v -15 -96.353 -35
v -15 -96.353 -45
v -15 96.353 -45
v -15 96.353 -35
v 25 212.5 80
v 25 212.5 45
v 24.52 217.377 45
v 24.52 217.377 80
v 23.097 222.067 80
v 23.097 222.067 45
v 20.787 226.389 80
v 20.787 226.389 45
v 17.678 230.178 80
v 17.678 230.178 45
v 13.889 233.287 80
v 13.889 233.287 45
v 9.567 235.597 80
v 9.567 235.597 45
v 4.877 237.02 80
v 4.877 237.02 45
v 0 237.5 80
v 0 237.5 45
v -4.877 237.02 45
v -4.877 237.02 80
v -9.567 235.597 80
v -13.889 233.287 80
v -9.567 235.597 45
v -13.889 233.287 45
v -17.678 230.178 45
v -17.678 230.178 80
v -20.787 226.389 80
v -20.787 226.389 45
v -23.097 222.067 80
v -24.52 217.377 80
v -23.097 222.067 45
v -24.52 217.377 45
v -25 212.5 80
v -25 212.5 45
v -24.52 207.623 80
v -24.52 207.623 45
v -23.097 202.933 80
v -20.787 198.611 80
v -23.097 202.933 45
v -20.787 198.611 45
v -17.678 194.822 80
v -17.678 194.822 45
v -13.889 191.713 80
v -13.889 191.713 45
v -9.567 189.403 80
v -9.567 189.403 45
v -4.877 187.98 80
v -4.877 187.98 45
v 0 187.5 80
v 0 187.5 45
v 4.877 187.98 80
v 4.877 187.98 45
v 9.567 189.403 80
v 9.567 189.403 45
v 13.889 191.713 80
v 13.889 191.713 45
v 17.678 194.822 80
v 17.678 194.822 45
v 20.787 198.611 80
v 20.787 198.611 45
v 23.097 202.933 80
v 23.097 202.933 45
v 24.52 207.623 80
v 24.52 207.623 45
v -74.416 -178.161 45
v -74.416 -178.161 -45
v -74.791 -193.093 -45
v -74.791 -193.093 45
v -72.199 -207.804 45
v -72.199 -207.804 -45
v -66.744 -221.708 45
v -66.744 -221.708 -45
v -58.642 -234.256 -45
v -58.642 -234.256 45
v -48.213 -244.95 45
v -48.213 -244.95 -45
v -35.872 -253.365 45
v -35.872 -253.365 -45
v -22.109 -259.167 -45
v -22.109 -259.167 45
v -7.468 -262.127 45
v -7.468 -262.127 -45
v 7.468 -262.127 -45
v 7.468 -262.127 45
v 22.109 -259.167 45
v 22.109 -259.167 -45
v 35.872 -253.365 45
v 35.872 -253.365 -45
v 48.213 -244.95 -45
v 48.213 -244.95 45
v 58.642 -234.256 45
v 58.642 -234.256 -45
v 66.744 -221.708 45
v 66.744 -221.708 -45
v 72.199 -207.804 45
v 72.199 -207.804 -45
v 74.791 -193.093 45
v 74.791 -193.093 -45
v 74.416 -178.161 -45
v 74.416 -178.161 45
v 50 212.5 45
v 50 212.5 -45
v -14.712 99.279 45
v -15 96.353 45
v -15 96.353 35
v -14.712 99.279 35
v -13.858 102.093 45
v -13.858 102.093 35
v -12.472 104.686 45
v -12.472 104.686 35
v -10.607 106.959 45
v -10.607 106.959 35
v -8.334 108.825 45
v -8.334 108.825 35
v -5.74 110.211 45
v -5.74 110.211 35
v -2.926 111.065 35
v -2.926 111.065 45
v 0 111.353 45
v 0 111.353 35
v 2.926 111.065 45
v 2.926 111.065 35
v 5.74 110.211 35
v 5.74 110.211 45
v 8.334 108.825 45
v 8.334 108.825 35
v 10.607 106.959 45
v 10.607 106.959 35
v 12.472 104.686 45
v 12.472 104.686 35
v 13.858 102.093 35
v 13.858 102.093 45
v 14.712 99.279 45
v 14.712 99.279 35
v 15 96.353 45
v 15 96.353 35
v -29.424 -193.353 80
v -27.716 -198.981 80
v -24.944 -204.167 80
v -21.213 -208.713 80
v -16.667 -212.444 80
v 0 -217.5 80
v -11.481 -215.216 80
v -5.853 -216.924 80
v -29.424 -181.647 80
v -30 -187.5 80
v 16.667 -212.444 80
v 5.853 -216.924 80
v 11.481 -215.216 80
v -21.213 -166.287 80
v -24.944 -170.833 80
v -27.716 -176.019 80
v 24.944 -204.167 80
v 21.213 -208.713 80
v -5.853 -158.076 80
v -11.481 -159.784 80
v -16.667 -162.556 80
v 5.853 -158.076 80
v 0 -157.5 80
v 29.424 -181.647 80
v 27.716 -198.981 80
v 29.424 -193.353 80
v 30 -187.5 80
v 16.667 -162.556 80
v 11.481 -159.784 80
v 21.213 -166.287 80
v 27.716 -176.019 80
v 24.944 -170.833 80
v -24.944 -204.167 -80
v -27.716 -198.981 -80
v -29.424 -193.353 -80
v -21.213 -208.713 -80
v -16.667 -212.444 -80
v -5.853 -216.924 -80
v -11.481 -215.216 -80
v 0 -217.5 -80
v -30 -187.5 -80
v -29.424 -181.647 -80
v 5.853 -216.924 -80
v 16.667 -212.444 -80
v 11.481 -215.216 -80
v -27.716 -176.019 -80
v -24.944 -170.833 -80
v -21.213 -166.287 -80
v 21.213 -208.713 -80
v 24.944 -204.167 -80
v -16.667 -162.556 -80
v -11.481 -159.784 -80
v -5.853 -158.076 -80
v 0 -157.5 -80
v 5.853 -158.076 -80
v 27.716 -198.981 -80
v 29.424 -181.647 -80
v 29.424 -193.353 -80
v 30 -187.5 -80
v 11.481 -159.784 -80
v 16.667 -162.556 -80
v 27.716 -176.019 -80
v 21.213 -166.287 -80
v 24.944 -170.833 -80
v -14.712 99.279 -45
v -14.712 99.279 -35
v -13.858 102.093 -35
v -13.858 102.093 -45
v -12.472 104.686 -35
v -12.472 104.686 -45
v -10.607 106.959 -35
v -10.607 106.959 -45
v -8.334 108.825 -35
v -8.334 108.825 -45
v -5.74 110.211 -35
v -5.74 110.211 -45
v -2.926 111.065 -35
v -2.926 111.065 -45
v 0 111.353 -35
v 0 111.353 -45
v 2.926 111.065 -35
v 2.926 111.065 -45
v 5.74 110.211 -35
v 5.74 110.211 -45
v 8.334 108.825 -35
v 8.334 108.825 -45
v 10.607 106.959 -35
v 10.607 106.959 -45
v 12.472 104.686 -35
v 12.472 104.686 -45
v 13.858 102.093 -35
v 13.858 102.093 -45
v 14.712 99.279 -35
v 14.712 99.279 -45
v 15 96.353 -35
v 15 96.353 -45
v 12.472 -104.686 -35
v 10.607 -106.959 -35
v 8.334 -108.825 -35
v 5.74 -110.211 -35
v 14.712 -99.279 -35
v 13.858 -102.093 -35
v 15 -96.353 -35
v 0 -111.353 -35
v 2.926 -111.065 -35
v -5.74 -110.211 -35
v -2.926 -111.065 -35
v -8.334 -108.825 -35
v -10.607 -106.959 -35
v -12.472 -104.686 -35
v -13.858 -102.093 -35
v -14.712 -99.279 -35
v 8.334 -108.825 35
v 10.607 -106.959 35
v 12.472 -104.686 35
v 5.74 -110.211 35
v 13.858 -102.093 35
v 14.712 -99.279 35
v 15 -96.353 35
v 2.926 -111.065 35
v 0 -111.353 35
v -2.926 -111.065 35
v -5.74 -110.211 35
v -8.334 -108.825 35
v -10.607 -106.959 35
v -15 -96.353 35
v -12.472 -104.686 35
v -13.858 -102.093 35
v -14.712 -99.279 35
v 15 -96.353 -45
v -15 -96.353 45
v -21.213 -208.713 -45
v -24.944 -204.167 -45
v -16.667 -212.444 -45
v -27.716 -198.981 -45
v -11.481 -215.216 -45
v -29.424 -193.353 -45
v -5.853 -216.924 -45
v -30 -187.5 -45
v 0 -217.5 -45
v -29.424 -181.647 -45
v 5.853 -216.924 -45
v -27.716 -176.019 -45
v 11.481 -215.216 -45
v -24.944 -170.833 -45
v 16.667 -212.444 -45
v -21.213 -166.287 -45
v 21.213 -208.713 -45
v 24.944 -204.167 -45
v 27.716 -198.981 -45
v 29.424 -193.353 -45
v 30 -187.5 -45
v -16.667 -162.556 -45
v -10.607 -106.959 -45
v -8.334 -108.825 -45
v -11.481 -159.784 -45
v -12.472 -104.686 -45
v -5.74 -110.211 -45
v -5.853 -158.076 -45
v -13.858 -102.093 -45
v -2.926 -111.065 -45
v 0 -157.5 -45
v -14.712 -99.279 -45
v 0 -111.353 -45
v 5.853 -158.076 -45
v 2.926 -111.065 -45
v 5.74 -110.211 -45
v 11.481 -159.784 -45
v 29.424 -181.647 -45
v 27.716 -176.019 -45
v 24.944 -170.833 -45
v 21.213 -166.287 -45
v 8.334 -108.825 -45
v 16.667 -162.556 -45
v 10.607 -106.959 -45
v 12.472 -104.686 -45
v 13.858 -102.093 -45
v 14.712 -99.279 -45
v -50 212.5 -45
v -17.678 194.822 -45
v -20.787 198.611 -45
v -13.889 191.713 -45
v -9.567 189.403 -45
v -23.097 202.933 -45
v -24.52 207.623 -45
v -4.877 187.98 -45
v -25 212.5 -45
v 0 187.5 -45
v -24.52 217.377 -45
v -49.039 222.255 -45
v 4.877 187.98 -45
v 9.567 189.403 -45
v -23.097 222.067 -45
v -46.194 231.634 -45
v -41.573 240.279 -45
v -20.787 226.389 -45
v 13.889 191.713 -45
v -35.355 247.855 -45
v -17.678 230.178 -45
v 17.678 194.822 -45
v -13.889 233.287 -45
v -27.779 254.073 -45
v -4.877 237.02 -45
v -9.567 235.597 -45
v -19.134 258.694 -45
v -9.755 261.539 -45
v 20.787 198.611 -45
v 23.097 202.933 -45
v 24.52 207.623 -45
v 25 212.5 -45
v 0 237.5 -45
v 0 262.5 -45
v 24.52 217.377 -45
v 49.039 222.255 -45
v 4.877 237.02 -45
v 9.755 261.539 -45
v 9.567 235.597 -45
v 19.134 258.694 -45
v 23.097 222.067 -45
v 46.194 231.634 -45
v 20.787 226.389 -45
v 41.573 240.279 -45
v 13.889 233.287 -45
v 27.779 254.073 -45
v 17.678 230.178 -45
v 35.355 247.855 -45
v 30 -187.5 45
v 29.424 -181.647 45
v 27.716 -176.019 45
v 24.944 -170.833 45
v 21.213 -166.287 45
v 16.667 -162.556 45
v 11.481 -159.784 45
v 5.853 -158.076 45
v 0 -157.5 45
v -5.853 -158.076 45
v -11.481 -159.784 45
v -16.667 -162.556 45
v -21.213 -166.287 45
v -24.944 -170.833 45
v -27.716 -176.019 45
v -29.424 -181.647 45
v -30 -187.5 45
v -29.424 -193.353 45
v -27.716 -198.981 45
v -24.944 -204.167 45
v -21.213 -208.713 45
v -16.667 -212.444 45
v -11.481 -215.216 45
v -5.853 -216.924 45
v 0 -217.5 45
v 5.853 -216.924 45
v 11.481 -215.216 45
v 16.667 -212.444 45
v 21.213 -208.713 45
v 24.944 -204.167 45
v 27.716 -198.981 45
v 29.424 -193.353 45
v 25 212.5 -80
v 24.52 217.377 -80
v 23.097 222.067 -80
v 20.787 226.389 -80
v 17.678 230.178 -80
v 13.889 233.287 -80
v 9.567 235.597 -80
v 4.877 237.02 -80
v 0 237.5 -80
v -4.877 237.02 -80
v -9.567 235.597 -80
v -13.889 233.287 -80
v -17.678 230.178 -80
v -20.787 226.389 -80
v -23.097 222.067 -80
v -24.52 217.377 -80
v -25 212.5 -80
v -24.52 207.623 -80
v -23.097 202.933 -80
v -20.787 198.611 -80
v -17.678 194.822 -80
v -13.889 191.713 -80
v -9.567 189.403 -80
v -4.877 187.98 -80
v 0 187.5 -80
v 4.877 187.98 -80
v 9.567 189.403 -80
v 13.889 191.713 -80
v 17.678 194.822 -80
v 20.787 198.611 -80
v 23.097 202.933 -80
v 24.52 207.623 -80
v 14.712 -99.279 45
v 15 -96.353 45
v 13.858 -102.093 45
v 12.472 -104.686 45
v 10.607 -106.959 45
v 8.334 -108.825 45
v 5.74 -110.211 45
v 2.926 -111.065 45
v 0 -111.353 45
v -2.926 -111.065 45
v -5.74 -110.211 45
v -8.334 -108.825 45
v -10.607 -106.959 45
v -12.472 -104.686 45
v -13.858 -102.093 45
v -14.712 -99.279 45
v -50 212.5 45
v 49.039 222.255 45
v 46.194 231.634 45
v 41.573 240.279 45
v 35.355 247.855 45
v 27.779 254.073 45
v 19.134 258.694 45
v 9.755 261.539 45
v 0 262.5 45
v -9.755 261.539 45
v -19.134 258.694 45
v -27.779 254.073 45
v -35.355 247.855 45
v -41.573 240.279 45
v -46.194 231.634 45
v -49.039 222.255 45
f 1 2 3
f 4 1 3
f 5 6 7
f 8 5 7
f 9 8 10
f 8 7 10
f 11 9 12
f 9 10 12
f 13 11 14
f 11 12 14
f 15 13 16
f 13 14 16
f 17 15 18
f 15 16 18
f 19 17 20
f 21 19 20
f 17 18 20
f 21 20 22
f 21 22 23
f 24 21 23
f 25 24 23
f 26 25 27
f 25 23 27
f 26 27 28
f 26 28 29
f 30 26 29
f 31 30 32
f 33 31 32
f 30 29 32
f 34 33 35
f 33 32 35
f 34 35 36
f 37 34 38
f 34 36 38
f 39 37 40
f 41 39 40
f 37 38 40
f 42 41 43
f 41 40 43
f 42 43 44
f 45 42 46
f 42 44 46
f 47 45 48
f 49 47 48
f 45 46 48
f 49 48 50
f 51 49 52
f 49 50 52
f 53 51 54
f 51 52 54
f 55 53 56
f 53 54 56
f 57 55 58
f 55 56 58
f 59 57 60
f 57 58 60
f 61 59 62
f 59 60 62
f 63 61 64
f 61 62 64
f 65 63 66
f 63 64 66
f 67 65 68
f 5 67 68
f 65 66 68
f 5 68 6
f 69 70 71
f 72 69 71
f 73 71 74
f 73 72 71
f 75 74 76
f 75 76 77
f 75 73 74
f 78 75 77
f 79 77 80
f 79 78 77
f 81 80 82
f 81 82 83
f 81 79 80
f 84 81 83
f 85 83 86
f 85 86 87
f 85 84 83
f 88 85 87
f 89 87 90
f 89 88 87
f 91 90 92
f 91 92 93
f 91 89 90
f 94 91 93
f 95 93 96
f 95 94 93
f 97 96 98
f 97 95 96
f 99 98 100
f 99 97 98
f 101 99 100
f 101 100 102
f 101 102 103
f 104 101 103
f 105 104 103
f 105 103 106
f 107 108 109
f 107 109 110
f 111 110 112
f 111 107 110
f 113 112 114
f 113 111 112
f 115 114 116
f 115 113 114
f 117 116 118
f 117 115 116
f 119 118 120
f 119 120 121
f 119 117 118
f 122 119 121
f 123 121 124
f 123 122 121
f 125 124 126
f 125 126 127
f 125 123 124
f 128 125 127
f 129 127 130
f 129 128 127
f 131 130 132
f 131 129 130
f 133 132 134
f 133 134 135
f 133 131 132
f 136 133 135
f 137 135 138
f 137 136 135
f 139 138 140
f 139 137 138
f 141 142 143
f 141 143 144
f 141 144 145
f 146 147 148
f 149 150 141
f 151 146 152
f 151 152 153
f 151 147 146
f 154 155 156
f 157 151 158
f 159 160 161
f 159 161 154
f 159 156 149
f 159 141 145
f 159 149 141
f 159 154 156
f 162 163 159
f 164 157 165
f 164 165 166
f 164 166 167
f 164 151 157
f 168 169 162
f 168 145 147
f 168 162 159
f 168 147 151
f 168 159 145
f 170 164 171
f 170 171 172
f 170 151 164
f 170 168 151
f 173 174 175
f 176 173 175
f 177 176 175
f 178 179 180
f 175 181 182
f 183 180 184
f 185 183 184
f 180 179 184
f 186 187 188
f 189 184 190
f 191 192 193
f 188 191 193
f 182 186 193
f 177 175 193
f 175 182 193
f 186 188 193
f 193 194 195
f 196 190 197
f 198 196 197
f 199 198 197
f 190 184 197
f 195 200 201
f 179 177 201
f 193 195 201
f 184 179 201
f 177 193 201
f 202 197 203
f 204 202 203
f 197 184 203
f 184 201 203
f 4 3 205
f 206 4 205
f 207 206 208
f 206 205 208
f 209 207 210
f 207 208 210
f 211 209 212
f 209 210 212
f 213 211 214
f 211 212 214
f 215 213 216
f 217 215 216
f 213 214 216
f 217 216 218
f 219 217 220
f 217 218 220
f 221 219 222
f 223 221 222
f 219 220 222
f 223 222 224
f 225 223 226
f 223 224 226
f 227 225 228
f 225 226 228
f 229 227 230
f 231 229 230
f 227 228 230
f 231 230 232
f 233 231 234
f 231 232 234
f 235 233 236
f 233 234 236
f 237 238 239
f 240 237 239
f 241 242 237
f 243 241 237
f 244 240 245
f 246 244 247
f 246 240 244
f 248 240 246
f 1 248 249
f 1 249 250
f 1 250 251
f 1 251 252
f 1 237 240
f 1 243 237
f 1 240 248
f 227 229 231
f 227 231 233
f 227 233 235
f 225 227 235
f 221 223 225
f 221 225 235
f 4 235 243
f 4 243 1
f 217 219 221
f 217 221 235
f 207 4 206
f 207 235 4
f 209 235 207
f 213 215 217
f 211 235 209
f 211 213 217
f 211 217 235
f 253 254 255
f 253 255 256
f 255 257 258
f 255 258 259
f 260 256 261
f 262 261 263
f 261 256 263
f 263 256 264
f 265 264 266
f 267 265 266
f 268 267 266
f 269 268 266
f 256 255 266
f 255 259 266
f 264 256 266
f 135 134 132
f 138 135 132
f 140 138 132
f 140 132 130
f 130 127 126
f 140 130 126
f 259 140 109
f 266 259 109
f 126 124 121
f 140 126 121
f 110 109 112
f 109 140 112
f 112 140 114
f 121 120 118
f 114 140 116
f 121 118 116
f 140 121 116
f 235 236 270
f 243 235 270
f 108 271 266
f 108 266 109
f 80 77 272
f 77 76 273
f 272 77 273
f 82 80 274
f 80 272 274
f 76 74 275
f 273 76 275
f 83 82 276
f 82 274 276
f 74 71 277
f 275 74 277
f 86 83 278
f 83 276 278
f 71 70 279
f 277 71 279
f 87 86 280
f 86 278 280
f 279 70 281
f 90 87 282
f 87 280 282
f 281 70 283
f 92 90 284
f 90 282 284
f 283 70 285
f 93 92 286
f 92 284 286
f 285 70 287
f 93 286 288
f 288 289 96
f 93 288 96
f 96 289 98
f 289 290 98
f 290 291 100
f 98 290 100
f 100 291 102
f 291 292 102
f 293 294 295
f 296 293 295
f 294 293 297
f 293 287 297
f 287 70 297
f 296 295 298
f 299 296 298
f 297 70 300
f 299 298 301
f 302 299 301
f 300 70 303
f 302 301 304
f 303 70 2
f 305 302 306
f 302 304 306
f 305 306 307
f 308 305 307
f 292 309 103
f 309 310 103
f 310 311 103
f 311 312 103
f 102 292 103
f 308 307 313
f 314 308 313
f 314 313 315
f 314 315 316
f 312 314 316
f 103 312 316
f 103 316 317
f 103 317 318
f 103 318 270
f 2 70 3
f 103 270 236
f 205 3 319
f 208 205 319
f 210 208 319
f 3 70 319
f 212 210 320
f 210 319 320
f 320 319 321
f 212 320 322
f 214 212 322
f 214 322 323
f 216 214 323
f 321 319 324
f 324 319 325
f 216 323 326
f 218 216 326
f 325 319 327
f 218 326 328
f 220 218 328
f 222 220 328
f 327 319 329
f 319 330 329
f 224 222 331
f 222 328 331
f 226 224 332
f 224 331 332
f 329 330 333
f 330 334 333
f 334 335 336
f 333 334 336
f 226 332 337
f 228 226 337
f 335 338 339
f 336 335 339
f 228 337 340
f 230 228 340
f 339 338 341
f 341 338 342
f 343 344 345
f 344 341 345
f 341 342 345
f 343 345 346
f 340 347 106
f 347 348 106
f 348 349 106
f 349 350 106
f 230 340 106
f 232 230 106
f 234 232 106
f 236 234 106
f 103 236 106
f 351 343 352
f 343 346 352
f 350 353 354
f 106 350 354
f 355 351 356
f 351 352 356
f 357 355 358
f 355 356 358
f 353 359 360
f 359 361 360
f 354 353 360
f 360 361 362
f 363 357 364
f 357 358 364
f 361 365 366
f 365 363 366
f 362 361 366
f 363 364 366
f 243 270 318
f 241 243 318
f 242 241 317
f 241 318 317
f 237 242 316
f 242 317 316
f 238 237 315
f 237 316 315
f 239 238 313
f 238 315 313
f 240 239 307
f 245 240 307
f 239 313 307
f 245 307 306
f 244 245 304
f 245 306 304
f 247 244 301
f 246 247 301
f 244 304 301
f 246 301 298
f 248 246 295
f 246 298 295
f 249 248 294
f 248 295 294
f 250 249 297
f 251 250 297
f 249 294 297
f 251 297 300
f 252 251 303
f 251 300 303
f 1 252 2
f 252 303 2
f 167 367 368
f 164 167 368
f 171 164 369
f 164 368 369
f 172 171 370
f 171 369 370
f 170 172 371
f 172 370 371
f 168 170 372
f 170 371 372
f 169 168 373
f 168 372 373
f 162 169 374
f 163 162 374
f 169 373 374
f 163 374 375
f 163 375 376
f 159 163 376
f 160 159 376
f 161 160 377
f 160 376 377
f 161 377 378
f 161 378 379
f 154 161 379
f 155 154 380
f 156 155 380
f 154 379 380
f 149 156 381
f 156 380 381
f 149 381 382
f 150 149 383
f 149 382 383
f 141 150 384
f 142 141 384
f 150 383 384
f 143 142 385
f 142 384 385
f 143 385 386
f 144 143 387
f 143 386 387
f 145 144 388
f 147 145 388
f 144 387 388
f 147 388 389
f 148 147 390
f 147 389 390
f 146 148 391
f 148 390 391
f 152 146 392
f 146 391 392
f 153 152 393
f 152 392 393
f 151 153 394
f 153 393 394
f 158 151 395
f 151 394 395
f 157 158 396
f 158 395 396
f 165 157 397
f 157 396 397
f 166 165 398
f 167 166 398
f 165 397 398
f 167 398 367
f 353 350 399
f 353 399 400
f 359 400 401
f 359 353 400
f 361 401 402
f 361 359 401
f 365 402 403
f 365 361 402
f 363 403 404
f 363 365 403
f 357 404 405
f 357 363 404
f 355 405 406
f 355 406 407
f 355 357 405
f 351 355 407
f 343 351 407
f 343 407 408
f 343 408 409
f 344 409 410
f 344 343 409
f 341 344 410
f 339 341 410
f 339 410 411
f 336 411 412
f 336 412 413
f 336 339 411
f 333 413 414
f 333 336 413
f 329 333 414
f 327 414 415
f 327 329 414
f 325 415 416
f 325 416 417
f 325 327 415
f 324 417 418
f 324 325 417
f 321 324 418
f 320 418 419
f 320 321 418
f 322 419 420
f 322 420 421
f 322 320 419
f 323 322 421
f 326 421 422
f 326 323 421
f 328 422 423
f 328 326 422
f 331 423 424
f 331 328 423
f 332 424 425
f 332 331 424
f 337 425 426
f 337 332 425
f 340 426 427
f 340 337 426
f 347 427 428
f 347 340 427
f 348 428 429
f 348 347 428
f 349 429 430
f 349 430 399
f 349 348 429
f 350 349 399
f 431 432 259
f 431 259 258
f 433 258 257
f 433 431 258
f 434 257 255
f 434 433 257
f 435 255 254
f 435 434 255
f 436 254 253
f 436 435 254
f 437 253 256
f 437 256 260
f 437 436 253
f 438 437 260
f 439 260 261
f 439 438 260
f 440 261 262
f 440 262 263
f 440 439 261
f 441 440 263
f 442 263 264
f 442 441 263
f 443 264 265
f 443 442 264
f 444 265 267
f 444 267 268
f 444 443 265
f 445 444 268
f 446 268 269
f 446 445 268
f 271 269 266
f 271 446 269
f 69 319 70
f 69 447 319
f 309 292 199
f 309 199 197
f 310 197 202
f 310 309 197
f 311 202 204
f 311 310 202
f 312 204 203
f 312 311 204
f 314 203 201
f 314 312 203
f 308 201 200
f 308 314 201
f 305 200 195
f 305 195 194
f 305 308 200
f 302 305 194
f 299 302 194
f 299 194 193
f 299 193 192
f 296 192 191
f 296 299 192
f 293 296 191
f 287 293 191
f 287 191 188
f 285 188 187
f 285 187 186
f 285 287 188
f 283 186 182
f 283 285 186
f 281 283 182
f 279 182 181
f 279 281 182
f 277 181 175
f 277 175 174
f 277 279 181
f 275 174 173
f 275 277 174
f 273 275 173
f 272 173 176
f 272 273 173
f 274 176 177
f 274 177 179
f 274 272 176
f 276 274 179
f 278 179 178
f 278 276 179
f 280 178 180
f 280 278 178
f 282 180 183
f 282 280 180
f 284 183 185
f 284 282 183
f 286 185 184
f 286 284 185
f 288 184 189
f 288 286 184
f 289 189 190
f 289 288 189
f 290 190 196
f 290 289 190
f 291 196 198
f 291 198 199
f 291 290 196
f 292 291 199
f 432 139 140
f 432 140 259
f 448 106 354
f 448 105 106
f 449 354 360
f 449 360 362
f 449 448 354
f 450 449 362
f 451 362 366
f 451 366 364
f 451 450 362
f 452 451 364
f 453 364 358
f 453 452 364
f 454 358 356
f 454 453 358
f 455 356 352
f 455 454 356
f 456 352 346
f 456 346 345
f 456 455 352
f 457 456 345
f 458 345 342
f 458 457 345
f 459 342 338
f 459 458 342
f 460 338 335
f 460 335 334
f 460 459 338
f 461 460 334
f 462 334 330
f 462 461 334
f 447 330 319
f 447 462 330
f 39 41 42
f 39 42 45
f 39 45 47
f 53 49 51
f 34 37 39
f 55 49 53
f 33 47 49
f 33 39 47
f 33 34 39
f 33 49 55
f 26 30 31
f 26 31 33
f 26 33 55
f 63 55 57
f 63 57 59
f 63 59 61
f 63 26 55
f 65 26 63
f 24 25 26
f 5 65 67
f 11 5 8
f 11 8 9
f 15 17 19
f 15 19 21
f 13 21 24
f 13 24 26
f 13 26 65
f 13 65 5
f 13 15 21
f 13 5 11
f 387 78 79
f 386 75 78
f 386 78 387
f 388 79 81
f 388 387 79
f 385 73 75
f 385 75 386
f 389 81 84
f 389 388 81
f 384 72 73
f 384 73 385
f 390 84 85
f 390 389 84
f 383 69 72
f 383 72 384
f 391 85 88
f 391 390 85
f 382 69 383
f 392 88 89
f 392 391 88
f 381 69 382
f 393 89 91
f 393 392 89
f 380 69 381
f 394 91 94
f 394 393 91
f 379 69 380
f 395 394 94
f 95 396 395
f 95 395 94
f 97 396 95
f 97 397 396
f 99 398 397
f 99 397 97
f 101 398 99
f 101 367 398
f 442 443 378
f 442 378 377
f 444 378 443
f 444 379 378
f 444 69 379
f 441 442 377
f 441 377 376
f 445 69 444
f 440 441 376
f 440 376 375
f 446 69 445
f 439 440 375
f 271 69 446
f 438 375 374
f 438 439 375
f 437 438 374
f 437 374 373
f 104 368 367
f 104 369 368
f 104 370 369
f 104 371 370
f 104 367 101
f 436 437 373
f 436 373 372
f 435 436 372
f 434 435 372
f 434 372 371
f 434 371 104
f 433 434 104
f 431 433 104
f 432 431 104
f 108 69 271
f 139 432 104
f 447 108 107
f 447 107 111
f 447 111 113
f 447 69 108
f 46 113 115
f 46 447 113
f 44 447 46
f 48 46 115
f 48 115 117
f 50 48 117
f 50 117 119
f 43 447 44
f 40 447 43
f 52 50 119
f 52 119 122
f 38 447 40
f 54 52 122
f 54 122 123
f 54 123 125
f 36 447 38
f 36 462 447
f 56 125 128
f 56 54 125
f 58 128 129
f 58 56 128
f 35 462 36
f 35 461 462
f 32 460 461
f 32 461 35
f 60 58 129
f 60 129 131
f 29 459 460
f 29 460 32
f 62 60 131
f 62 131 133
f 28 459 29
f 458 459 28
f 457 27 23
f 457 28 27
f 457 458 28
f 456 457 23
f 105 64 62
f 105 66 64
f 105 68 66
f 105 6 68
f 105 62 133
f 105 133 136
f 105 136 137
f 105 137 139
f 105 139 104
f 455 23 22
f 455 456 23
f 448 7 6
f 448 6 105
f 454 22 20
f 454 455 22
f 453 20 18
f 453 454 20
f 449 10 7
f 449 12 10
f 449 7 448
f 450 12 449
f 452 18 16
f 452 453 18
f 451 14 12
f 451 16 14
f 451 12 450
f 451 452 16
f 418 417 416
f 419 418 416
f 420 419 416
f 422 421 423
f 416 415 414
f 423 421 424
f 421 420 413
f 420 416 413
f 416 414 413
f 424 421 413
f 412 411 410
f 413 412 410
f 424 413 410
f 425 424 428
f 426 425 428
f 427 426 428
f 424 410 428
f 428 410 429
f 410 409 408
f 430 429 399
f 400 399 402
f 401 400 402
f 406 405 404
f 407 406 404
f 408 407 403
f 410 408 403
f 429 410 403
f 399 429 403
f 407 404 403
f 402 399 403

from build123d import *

# Parameters (mm, degrees)
BOSS_EXTRUDE1_DEPTH = 45
SKETCH2_R           = 25
SKETCH2_R_2         = 30
BOSS_EXTRUDE2_DEPTH = 35
CUT_EXTRUDE1_DEPTH  = 10


with BuildPart() as part:
    # Sketch1 → Boss-Extrude1 (new, symmetric)
    with BuildSketch(Plane.XY):
        with BuildLine():
            Line((-50, 212.5), (-74.416342412, -178.161478599))
            ThreePointArc((-74.416342412, -178.161478599), (0, -262.5), (74.416342412, -178.161478599))
            Line((74.416342412, -178.161478599), (50, 212.5))
            ThreePointArc((50, 212.5), (0, 262.5), (-50, 212.5))
        make_face()
    extrude(amount=BOSS_EXTRUDE1_DEPTH, both=True)

    # Sketch2 → Boss-Extrude2 (add)
    with BuildSketch(Plane.XY.offset(45)):
        with Locations((0, 212.5)):
            Circle(SKETCH2_R)
        with Locations((0, -187.5)):
            Circle(SKETCH2_R_2)
    boss_extrude2 = extrude(amount=BOSS_EXTRUDE2_DEPTH)

    # Mirror1: Boss-Extrude2 across plane
    add(boss_extrude2.mirror(Plane.XY))

    # Sketch3 → Cut-Extrude1 (cut)
    with BuildSketch(Plane.XY.offset(45)):
        with BuildLine():
            Line((15, 96.352828314), (15, -96.352828314))
            ThreePointArc((15, -96.352828314), (0, -111.352828314), (-15, -96.352828314))
            Line((-15, -96.352828314), (-15, 96.352828314))
            ThreePointArc((-15, 96.352828314), (0, 111.352828314), (15, 96.352828314))
        make_face()
    cut_extrude1 = extrude(amount=-CUT_EXTRUDE1_DEPTH, mode=Mode.SUBTRACT)

    # Mirror2: Cut-Extrude1 across plane
    add(cut_extrude1.mirror(Plane.XY), mode=Mode.SUBTRACT)


solid = part.part
